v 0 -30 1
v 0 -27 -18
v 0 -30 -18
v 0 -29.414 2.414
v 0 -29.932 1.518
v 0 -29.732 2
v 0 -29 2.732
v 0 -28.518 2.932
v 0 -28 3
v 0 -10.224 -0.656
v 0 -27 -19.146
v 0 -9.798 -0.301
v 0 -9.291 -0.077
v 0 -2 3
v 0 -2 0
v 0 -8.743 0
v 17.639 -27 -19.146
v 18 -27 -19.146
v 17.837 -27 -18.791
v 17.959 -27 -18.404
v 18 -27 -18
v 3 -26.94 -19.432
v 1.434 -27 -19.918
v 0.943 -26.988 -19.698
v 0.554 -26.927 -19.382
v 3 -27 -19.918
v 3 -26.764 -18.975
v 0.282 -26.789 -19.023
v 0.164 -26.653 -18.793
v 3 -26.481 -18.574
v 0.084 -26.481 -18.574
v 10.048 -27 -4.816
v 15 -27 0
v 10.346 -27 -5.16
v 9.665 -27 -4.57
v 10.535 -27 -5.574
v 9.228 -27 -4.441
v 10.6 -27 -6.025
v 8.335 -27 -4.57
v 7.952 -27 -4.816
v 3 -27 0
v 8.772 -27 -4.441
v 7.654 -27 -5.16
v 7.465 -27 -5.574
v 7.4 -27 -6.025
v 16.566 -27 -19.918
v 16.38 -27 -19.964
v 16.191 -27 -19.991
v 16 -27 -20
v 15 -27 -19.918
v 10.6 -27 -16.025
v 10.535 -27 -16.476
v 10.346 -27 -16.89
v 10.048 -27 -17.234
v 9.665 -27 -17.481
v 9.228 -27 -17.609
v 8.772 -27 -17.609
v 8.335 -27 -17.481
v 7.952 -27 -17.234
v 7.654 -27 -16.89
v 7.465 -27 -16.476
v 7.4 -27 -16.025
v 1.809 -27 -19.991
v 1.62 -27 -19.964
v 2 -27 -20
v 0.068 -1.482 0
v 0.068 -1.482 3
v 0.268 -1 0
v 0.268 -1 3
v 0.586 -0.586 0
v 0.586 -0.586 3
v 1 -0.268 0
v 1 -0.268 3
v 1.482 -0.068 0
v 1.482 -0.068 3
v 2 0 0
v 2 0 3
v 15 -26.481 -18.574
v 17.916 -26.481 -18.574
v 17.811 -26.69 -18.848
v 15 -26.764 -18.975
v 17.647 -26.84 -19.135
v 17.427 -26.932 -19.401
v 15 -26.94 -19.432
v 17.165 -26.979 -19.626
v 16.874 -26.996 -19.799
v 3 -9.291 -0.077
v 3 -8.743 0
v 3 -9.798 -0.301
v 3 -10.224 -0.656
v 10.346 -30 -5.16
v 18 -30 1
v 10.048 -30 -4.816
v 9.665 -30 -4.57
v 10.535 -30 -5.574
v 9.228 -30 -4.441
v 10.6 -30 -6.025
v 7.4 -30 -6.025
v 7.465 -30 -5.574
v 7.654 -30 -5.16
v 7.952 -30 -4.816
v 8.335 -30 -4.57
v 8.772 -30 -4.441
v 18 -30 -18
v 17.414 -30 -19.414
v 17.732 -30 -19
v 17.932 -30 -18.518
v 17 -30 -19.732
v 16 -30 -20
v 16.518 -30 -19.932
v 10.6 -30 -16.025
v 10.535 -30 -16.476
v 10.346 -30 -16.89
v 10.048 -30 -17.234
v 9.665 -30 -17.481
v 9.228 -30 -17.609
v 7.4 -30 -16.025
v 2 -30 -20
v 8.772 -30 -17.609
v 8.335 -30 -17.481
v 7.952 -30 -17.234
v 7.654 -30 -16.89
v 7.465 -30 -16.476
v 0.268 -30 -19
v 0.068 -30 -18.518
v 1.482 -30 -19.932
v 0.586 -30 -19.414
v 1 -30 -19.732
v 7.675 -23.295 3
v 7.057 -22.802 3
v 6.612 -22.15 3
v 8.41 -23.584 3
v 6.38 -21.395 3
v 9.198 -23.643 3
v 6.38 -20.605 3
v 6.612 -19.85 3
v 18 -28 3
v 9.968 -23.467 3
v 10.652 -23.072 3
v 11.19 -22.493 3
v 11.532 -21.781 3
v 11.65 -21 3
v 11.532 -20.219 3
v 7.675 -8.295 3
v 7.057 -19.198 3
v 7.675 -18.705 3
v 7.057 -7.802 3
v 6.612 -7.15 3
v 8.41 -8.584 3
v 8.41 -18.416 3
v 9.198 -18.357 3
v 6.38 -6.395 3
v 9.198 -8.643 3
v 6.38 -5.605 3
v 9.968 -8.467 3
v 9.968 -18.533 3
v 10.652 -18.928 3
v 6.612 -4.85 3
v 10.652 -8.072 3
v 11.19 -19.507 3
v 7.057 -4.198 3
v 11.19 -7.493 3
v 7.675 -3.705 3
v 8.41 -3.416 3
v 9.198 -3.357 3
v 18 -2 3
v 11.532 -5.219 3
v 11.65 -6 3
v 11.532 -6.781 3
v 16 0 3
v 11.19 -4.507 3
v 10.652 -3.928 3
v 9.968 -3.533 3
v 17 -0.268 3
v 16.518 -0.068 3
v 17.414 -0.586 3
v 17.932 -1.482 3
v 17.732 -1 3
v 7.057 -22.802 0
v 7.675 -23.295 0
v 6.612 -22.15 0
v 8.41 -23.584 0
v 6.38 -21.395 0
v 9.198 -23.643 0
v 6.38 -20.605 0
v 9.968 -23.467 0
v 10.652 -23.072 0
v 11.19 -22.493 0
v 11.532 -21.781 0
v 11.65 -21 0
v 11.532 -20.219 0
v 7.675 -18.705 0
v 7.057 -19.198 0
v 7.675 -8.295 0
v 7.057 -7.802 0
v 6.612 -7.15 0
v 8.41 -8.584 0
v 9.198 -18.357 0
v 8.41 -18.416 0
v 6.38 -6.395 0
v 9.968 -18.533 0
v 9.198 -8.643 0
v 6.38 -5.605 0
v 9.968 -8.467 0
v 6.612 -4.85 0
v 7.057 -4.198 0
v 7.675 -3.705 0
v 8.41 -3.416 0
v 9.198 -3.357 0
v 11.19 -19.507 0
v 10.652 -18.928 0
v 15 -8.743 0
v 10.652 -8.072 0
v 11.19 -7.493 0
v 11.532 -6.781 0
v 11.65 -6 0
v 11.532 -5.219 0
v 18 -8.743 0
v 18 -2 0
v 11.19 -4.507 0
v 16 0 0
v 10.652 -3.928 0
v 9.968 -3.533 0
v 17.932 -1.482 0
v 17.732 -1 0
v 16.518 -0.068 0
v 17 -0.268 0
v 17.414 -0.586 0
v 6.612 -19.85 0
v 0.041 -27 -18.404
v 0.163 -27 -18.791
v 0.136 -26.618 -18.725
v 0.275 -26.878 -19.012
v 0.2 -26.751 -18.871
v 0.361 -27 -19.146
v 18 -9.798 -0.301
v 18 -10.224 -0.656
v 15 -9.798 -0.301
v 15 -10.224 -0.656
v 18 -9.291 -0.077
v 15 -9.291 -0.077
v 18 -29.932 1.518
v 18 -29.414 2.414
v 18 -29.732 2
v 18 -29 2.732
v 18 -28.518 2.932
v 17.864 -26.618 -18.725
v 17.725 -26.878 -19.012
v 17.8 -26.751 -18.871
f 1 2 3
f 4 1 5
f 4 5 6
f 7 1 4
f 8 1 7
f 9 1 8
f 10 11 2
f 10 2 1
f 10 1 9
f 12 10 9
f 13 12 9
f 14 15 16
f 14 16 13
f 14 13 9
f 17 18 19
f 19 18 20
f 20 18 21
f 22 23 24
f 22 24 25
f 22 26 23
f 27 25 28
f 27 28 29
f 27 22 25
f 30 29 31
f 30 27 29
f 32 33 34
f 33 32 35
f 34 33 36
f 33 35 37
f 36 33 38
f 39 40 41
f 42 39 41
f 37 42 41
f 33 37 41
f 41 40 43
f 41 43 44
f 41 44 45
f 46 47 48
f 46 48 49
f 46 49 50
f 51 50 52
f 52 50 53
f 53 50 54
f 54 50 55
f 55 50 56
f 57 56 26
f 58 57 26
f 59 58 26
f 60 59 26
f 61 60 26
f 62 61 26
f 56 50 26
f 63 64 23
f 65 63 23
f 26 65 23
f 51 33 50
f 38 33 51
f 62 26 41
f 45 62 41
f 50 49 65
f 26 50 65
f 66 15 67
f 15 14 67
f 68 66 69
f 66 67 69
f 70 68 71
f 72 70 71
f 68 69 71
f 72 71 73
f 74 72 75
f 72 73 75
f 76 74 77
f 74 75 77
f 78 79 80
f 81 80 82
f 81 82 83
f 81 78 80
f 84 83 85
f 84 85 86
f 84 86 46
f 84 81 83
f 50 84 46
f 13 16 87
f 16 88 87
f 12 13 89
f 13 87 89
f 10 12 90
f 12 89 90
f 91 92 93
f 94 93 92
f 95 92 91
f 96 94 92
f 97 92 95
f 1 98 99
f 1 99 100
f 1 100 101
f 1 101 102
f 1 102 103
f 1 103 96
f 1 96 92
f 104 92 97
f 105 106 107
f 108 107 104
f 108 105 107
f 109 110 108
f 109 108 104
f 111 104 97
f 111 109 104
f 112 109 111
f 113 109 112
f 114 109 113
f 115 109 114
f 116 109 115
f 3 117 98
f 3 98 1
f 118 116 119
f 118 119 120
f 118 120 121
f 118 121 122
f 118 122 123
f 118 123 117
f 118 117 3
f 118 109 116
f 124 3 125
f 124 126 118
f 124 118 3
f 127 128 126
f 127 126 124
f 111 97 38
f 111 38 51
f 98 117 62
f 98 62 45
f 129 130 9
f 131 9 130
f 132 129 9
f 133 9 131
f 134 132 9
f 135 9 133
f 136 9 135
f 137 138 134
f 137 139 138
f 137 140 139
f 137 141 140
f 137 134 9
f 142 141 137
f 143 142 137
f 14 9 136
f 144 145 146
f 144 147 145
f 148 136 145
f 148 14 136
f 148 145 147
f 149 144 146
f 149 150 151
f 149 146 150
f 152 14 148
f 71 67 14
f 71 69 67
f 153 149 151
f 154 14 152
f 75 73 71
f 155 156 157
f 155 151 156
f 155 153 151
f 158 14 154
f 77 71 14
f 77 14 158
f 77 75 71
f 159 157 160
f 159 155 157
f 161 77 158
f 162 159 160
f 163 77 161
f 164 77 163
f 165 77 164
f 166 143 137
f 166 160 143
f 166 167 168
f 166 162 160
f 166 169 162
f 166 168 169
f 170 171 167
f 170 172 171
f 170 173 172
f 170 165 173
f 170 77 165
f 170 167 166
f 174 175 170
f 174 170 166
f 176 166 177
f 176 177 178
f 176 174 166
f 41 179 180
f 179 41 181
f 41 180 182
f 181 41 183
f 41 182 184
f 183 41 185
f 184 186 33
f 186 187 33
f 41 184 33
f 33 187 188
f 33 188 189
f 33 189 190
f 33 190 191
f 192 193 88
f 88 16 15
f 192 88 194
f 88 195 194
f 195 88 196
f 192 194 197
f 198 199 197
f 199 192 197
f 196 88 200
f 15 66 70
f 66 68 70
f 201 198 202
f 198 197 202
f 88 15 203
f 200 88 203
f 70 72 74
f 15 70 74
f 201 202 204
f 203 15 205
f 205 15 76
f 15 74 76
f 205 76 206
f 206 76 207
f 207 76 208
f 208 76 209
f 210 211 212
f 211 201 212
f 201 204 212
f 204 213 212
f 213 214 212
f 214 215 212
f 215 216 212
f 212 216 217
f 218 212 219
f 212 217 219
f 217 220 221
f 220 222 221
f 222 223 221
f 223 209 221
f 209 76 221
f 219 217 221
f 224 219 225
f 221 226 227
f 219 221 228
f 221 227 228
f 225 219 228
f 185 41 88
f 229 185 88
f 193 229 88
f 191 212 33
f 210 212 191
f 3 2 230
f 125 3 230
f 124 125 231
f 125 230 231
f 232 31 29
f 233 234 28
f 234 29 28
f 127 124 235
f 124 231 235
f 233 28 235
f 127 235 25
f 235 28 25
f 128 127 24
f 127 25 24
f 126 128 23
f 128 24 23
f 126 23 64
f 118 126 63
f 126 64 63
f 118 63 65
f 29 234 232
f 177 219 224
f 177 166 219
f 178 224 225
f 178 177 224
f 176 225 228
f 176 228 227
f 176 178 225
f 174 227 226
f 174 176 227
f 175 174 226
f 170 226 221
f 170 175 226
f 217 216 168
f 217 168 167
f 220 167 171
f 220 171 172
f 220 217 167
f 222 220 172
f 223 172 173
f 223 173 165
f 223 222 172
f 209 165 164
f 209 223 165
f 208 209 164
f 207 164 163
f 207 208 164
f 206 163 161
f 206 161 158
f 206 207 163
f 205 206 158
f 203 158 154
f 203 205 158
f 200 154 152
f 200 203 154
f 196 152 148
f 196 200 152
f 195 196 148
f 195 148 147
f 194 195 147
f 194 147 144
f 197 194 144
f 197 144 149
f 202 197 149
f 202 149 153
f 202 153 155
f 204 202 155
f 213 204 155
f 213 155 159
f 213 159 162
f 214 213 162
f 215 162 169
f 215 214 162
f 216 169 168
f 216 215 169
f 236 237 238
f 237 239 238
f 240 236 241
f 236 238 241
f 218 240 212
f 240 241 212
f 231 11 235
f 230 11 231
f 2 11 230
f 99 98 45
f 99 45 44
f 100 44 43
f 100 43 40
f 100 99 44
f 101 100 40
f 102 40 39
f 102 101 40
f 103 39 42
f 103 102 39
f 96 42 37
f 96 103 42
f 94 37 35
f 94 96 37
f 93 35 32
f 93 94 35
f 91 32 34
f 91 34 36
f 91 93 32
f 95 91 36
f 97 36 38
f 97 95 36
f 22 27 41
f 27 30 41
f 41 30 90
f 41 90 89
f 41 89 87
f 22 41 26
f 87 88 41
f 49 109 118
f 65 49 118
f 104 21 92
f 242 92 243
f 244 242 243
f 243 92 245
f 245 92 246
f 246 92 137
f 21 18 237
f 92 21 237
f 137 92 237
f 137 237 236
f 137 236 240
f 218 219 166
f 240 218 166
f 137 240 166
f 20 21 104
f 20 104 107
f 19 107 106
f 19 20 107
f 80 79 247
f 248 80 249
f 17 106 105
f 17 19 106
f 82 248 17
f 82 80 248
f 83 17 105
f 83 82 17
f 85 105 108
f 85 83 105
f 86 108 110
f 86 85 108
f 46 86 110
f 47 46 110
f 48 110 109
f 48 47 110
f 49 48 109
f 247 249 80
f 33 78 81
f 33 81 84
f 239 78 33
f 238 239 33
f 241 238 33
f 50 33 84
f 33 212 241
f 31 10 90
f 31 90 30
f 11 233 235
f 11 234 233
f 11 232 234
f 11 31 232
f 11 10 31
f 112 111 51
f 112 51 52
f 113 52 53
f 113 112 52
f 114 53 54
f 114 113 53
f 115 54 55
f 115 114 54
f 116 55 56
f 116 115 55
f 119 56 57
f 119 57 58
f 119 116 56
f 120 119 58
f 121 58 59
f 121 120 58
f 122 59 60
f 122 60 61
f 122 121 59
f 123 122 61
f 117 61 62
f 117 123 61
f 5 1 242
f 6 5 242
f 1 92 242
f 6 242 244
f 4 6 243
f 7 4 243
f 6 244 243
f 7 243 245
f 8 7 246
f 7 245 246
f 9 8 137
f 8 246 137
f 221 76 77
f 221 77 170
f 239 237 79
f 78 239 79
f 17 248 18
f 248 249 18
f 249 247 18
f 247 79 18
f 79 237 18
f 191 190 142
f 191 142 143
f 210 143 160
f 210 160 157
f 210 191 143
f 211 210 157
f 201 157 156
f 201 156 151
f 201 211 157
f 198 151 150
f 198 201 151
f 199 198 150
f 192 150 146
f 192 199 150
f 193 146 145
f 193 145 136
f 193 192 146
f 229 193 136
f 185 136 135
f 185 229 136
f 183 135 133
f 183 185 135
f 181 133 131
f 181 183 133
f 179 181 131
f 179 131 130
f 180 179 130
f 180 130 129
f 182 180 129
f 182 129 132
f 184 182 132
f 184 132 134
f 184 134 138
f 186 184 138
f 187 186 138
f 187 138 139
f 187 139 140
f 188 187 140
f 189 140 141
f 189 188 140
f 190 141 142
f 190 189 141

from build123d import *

# Parameters (mm, degrees)
SKETCH_1_W      = 18
SKETCH_1_H      = 30
SKETCH_1_R      = 2.65
EXTRUDE_1_DEPTH = 3
SKETCH_2_W      = 18
SKETCH_2_H      = 20
EXTRUDE_2_DEPTH = 3
FILLET_1_R      = 2
EXTRUDE_3_DEPTH = 3
EXTRUDE_4_DEPTH = 3
FILLET_2_R      = 2


with BuildPart() as part:
    # 草图1 → 凸台-拉伸1 (new body)
    with BuildSketch(Plane.XY):
        with Locations((9, -15)):
            Rectangle(SKETCH_1_W, SKETCH_1_H)
        with Locations((9, -6)):
            Circle(SKETCH_1_R, mode=Mode.SUBTRACT)
        with Locations((9, -21)):
            Circle(SKETCH_1_R, mode=Mode.SUBTRACT)
    extrude(amount=EXTRUDE_1_DEPTH)

    # 草图2 → 凸台-拉伸2 (add)
    with BuildSketch(Plane(origin=(0, -30, 0), x_dir=(-1, 0, 0), z_dir=(0, -1, 0))):
        with Locations((-9, 10)):
            Rectangle(SKETCH_2_W, SKETCH_2_H)
        with BuildLine():
            Line((-10.6, 6.025104147), (-10.6, 16.025104147))
            ThreePointArc((-10.6, 16.025104147), (-9, 17.625104147), (-7.4, 16.025104147))
            Line((-7.4, 16.025104147), (-7.4, 6.025104147))
            ThreePointArc((-7.4, 6.025104147), (-9, 4.425104147), (-10.6, 6.025104147))
        make_face(mode=Mode.SUBTRACT)
    extrude(amount=-EXTRUDE_2_DEPTH)

    # 圆角1
    fillet_1_edges = [part.edges().sort_by_distance(p)[0] for p in [
        (0, -28.5, -20),
        (18, -28.5, -20),
        (0, 0, 1.5),
        (18, 0, 1.5),
    ]]
    fillet(fillet_1_edges, radius=FILLET_1_R)

    # 草图3 → 凸台-拉伸3 (add)
    with BuildSketch(Plane.ZY):
        Polygon((0, -9.628512941), (-19.146125, -27), (0, -27), align=None)
    extrude(amount=-EXTRUDE_3_DEPTH)

    # 草图4 → 凸台-拉伸4 (add)
    with BuildSketch(Plane(origin=(18, 0, 0), x_dir=(0, 0, -1), z_dir=(1, 0, 0))):
        Polygon((0, -9.628512941), (19.146125, -27), (0, -27), align=None)
    extrude(amount=-EXTRUDE_4_DEPTH)

    # 圆角2
    fillet_2_edges = [part.edges().sort_by_distance(p)[0] for p in [
        (1.5, -9.628512941, 0),
        (1.680488334, -27, -19.146125),
        (16.319511666, -27, -19.146125),
        (16.5, -9.628512941, 0),
        (9, -30, 3),
    ]]
    fillet(fillet_2_edges, radius=FILLET_2_R)


solid = part.part
